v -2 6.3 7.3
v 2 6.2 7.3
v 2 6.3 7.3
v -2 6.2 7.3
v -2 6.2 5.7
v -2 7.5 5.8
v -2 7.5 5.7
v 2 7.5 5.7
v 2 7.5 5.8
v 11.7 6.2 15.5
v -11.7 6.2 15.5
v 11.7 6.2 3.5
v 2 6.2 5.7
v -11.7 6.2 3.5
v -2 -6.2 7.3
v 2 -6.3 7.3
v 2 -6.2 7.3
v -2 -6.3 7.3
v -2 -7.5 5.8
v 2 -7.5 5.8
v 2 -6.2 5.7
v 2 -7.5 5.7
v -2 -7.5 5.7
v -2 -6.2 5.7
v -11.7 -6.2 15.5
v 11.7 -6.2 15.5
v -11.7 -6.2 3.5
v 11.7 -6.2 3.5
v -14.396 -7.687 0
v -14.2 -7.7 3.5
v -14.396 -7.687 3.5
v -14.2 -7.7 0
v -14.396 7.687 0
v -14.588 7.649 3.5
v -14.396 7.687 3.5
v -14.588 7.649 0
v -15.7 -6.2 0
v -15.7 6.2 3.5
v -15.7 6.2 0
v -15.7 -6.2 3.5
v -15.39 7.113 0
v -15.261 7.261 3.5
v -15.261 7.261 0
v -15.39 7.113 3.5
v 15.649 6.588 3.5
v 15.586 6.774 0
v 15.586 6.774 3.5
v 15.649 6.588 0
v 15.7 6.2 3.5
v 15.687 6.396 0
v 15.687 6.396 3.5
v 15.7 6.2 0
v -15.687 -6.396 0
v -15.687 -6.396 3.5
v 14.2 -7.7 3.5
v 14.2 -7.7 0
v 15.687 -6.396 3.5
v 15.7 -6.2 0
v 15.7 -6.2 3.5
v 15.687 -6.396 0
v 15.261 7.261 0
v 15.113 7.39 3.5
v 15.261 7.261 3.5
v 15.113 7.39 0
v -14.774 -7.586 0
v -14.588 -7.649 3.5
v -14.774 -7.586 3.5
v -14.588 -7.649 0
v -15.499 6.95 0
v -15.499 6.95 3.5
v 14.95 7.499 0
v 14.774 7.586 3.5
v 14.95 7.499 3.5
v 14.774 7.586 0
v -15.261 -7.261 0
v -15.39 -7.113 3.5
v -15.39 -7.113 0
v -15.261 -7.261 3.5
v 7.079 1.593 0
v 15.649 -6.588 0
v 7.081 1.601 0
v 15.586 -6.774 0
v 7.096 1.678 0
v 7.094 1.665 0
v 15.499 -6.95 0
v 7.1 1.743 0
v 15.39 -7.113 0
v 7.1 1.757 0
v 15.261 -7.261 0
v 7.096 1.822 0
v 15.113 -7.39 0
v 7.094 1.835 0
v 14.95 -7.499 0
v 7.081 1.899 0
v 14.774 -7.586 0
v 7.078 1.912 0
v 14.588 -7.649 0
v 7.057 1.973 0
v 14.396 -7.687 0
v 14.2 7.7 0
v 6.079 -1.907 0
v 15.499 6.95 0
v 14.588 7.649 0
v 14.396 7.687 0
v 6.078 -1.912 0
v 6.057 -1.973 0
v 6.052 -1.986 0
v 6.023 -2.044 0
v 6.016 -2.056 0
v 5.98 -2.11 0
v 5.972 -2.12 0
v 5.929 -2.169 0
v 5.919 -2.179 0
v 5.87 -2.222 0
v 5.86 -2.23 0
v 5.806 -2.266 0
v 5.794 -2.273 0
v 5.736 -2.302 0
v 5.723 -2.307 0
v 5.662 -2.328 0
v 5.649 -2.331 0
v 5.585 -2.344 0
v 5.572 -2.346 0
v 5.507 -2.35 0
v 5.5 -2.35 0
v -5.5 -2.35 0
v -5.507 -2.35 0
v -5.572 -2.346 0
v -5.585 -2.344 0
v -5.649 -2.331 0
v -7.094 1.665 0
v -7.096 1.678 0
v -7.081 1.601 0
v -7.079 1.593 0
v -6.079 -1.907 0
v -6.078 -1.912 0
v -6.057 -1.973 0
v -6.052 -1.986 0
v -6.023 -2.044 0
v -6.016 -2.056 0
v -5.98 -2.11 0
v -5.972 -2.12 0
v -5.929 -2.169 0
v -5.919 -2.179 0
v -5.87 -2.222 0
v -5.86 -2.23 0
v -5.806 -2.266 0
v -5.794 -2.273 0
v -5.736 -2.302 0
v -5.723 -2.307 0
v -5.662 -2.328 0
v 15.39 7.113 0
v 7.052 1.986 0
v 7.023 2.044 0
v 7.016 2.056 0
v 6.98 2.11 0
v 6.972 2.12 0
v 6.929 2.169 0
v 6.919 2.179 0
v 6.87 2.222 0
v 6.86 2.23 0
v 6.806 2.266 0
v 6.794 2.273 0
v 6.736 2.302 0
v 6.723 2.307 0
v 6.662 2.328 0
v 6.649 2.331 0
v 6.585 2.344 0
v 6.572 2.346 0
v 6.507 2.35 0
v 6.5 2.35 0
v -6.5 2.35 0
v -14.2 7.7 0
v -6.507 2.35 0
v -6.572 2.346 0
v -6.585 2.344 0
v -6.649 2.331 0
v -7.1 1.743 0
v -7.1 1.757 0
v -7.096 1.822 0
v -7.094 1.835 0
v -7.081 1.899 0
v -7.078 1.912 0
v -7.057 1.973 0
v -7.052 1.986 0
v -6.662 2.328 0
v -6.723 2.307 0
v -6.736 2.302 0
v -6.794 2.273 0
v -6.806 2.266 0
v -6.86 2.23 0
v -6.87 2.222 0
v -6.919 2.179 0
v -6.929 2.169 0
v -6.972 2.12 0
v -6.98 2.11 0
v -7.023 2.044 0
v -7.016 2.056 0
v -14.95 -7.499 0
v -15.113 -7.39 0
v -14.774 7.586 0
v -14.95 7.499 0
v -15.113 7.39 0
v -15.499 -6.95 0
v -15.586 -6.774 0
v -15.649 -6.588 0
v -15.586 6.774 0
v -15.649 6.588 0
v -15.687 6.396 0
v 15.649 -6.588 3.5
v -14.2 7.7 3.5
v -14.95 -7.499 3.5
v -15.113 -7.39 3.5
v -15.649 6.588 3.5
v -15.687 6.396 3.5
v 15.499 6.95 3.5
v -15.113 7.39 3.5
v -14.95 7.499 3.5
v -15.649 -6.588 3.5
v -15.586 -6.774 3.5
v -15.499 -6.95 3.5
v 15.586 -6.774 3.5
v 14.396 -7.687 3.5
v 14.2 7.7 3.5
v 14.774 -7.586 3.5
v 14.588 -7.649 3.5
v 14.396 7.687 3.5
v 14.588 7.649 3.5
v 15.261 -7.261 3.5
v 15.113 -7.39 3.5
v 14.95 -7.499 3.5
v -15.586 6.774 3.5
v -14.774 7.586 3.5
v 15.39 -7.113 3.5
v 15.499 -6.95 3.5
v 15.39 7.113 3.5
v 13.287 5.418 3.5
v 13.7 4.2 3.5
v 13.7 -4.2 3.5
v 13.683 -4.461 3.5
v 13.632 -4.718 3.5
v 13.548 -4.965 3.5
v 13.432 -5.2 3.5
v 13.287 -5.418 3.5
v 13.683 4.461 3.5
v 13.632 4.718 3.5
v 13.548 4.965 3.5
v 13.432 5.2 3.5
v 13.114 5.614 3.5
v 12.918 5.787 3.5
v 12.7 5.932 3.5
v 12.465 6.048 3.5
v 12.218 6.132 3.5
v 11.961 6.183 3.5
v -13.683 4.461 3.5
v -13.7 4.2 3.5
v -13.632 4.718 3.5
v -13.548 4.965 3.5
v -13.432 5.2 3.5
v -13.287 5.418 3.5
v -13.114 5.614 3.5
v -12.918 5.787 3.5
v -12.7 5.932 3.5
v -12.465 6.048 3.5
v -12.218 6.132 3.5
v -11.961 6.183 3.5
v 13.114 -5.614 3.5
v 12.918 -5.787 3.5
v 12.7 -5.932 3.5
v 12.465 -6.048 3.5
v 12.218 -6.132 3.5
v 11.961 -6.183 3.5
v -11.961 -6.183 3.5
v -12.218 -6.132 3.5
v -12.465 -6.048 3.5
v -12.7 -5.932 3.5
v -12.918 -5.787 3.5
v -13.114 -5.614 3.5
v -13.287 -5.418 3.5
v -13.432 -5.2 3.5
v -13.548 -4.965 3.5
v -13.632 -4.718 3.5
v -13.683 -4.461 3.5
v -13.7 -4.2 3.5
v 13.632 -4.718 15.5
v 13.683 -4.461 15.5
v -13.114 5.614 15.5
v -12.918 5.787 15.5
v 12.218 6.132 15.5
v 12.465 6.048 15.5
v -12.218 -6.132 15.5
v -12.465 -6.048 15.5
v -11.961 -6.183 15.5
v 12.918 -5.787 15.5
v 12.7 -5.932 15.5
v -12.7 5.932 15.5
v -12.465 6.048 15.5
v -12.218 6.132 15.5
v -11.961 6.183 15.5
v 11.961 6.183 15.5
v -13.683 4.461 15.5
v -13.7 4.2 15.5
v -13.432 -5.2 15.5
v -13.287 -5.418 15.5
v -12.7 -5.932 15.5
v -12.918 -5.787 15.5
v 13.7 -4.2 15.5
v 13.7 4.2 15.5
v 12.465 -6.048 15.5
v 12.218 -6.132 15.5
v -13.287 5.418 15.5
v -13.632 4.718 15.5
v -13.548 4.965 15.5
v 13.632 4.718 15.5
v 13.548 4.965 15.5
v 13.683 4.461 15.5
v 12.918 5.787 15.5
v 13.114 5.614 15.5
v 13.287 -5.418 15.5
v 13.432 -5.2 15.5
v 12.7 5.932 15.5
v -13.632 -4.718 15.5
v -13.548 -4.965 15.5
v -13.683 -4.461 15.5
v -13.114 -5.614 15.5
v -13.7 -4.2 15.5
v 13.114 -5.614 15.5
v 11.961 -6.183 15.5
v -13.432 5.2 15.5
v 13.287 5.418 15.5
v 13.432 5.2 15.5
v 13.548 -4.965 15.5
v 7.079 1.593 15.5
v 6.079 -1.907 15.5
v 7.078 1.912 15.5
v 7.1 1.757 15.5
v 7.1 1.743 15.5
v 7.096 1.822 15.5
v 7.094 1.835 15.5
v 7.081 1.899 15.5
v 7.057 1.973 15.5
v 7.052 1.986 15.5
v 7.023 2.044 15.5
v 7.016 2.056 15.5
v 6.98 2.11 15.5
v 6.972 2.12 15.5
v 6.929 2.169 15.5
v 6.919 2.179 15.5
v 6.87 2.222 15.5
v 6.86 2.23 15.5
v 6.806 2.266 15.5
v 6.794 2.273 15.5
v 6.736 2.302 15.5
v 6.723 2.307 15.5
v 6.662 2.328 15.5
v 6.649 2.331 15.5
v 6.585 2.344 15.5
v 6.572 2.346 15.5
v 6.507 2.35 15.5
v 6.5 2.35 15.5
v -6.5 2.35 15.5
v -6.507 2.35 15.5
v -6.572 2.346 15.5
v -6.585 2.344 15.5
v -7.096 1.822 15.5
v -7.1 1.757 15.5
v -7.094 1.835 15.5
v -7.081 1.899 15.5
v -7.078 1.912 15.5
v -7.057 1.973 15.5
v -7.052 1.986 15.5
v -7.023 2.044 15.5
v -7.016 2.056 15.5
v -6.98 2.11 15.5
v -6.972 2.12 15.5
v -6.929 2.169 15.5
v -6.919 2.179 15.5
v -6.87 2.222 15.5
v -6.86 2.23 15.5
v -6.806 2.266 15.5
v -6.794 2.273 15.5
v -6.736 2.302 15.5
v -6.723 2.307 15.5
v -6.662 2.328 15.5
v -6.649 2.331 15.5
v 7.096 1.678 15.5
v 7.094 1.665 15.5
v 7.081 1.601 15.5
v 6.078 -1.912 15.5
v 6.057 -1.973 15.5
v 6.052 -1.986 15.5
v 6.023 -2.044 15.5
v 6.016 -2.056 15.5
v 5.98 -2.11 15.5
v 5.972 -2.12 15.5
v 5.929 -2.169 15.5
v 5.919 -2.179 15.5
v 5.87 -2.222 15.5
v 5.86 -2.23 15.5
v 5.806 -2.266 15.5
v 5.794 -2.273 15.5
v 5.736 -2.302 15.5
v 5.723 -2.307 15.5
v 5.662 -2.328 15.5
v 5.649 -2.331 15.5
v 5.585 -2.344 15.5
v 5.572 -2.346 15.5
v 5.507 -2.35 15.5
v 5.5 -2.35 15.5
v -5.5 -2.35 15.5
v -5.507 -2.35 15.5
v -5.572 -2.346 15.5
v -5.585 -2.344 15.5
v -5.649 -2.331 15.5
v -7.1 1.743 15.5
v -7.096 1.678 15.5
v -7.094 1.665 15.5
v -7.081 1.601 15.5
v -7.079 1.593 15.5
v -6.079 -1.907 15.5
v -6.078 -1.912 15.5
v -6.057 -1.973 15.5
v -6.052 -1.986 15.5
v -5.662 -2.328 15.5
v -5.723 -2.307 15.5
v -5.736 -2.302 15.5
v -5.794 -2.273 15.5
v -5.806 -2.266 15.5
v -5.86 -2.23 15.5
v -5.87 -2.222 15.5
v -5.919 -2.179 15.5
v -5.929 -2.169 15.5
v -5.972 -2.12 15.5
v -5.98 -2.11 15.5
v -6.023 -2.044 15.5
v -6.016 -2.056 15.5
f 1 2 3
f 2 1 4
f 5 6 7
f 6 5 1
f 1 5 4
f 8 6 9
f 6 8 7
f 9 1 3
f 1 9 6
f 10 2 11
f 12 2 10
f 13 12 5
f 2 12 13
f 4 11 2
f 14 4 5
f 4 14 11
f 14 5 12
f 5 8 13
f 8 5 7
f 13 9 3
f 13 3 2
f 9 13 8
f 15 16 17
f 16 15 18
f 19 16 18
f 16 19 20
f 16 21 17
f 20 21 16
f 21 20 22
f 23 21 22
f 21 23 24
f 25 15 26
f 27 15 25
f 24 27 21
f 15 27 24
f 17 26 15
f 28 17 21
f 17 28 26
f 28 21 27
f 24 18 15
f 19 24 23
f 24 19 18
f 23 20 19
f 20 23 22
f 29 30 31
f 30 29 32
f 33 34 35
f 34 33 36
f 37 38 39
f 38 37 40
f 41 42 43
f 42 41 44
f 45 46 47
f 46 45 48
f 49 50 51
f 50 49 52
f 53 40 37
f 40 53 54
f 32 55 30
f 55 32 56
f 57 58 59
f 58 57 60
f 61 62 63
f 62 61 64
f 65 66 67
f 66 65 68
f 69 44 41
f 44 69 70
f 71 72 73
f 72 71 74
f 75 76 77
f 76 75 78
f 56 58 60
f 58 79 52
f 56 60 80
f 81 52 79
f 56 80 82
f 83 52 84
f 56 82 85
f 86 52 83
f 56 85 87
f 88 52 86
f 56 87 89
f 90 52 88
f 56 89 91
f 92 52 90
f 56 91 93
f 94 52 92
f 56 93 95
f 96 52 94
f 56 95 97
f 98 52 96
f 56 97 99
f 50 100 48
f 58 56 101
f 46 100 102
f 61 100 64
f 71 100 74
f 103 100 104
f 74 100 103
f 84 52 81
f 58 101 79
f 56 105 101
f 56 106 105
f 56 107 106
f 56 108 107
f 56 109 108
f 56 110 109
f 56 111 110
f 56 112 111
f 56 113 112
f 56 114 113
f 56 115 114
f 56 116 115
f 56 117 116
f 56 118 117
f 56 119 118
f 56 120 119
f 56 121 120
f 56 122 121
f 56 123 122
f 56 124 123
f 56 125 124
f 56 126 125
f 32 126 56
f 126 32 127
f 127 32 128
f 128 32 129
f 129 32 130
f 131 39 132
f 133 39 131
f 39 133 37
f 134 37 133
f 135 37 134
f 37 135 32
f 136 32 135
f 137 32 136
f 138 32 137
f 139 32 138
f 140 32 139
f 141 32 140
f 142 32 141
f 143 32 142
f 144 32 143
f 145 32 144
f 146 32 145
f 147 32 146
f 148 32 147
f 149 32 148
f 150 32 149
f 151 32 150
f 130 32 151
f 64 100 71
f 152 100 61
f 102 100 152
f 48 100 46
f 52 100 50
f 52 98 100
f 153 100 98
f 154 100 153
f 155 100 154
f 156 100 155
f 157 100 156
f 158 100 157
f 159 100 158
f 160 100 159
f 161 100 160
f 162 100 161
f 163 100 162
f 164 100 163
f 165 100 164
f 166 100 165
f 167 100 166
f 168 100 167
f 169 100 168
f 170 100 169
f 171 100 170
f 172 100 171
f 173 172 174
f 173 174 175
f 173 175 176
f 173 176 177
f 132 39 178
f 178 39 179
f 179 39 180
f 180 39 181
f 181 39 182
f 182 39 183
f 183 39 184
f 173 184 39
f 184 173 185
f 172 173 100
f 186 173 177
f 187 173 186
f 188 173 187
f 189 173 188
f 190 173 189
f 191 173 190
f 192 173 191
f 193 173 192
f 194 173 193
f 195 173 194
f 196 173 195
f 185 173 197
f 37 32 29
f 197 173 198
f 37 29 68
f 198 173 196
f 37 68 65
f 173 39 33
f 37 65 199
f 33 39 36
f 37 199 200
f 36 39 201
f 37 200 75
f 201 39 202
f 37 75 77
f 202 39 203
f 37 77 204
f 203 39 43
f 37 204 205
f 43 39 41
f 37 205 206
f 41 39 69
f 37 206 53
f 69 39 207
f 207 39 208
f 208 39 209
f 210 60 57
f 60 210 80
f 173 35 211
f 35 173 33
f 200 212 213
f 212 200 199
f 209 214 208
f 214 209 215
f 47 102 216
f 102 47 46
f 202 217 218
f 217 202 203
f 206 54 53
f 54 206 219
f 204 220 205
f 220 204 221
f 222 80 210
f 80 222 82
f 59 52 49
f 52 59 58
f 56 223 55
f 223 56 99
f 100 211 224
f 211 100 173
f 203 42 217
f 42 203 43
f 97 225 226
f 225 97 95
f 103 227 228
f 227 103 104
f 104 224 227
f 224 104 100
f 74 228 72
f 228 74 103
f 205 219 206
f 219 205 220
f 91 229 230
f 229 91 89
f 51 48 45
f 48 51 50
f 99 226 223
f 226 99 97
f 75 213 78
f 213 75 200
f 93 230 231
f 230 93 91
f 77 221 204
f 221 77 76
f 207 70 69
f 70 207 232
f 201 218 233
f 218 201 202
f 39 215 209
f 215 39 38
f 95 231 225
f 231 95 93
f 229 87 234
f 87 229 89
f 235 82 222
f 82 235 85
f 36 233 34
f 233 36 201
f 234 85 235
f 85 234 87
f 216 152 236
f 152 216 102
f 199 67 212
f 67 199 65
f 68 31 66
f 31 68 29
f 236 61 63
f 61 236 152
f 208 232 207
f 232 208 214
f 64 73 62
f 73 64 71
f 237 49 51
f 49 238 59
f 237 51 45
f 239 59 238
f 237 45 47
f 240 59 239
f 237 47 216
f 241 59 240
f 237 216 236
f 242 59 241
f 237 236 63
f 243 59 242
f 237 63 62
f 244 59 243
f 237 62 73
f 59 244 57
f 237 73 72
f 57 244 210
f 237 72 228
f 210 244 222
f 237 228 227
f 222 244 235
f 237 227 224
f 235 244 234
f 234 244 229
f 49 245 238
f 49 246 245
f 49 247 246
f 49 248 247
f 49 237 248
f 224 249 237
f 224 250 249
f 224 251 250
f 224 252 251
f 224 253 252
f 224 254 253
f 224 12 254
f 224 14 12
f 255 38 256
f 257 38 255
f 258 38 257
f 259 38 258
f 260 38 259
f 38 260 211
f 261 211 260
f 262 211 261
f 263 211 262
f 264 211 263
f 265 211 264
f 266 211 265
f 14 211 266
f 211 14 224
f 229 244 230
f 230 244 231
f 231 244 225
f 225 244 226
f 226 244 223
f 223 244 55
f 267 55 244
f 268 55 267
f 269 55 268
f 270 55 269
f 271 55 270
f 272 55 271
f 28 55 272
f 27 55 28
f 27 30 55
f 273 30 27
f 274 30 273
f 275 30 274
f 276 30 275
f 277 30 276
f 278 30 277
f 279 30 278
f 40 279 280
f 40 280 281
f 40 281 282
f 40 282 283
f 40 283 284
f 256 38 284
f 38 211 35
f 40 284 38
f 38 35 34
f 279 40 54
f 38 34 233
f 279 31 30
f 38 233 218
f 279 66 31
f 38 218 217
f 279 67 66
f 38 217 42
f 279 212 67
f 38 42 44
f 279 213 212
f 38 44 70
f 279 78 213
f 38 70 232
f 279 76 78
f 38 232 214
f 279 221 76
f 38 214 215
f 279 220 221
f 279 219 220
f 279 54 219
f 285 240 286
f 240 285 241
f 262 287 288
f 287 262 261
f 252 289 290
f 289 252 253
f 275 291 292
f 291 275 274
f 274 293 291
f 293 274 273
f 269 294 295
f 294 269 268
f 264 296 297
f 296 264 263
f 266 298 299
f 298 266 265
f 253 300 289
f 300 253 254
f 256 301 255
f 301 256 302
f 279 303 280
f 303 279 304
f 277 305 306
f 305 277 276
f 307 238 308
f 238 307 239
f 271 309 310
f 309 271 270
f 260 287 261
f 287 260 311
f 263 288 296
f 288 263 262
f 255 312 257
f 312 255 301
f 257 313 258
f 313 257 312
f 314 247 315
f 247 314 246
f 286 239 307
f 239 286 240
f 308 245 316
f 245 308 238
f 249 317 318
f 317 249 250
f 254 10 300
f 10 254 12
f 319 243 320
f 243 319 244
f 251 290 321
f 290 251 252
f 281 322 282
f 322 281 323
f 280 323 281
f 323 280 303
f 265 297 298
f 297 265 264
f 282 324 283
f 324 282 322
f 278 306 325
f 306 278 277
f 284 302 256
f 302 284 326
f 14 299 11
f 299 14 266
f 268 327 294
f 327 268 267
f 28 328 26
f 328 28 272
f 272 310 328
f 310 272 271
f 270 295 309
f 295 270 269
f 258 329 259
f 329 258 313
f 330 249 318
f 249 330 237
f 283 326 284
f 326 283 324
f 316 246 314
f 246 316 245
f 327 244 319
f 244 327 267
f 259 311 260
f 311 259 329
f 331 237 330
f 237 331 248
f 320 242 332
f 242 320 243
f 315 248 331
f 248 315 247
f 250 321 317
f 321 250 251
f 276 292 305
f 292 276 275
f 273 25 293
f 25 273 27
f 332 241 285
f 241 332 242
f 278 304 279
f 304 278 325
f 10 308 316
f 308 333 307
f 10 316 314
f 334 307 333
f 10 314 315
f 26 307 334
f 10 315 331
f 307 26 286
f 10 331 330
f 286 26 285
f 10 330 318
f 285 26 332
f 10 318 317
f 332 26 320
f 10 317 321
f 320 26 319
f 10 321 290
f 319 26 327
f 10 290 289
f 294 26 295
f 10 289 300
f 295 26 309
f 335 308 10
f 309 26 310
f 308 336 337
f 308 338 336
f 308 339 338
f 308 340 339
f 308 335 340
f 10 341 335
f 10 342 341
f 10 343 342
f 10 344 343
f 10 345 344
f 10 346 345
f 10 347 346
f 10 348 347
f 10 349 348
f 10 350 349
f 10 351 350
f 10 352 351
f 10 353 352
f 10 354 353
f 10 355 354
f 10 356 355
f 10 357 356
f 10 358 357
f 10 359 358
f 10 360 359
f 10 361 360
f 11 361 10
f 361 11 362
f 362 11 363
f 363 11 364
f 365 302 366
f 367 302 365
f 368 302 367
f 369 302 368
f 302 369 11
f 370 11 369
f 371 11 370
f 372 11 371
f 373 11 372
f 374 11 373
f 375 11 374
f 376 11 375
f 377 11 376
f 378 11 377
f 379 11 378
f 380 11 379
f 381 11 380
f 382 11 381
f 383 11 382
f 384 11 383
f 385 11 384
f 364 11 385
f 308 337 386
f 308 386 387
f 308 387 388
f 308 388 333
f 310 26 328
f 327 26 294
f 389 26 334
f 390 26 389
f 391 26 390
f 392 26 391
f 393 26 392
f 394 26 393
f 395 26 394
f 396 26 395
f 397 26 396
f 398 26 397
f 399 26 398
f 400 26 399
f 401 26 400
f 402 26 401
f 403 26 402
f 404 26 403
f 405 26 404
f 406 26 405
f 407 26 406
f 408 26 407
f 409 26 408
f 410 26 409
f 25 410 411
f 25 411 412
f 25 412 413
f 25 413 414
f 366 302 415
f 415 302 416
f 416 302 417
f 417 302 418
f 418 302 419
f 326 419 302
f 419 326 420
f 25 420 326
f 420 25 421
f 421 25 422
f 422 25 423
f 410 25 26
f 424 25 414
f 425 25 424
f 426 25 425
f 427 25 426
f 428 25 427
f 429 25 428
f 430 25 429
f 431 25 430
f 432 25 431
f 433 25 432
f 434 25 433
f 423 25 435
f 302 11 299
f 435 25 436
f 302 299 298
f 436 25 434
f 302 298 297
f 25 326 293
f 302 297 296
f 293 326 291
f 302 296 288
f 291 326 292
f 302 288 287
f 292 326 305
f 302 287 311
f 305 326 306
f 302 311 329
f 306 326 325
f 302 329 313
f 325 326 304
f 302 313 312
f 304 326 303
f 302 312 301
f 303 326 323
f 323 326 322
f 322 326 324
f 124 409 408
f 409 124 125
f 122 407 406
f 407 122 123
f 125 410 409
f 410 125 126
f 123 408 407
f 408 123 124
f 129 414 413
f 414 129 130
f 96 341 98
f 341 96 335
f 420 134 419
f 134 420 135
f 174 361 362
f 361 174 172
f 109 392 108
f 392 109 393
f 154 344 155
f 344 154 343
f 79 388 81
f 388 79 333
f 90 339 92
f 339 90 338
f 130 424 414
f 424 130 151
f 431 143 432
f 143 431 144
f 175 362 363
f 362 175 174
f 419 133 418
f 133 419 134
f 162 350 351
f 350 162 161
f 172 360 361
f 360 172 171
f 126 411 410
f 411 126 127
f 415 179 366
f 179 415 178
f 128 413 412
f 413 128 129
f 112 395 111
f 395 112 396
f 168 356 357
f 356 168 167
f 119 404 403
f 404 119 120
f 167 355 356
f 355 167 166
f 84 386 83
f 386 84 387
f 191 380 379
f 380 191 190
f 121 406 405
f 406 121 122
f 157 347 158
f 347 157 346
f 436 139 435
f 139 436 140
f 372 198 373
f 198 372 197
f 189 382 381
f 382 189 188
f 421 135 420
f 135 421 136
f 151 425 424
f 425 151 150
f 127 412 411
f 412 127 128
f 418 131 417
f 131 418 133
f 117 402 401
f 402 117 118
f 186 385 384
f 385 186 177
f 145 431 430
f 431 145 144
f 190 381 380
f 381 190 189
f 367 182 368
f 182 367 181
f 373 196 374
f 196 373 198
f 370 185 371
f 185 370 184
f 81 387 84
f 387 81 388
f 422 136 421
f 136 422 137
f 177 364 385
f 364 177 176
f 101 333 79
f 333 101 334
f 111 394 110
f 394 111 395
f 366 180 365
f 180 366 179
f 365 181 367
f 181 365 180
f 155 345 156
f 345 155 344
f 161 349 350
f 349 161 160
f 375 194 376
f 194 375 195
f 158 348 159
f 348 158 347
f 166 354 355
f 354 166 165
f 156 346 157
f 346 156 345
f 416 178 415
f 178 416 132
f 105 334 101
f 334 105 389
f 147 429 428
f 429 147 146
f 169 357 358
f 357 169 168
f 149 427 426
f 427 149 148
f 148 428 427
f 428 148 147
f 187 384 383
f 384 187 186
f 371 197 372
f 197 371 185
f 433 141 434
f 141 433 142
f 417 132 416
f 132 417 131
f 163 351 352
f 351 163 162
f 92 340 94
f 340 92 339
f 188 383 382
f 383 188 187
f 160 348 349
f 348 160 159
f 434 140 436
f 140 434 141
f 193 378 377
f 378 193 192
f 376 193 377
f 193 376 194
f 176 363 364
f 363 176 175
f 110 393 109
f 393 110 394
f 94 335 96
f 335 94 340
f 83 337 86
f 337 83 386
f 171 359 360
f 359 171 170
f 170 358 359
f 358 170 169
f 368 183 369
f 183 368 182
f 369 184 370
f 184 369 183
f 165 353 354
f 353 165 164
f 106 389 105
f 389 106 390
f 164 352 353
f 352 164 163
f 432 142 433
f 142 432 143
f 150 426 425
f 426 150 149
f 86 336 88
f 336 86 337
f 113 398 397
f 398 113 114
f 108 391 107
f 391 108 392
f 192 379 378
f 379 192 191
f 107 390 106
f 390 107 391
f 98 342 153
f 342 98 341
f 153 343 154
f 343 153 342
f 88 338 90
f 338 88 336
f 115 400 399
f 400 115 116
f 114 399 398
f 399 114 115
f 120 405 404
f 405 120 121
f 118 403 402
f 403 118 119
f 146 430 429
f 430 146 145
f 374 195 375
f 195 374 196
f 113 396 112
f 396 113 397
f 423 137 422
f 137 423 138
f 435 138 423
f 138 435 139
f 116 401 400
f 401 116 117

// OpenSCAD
// file: parameters.scad
// ============================================
// MODULAR CABLE ORGANIZER - SHARED PARAMETERS
// ============================================
// All dimensions in mm - include this in all files
// ============================================

$fn = 48;

// === TOLERANCES ===
clearance = 0.3;
port_clearance = 0.1;  // Extra clearance for port openings (reduced - 0.2 was too loose for USB-C)
wall = 1.6;

// === SLOT DIMENSIONS (2:1 aspect ratio) - scaled to 2/3 ===
slot_width = 32;  // Reduced by 1mm for more compact insert
slot_height = 16;  // Reduced by 1mm for more compact insert
slot_depth = 4;  // Reduced from 6mm - less frame depth needed

// === FRAME STRUCTURE ===
frame_wall = 0.5;   // Reduced for more compact frame
frame_border = 8;  // Increased by 10mm for mounting holes with countersink
frame_back = 2;     // Slightly thicker for snap catch strength
mount_hole_dia = 3;
countersink_dia = 6;  // Diameter of countersink for screw heads
countersink_depth = 2;  // Depth of countersink

// === GRID ===
grid_cols = 2;
grid_rows = 2;

// === INSERT BASE DIMENSIONS ===
insert_width = slot_width - (2 * clearance);
insert_height = slot_height - (2 * clearance);
insert_base_depth = slot_depth - 0.5;

// === INSERT BODY (protrudes from frame) ===
insert_body_width = insert_width - 4;
insert_body_height = insert_height - 3;
insert_body_depth = 12;  // Deep enough to accommodate male cable connectors
insert_top_thick = 1.5;  // Top platform thickness

// === SNAP TABS (on neck/body - catch on back plate) ===
snap_tab_width = 4;
snap_tab_protrude = 1.2;  // How far tab sticks out from body
snap_tab_thick = 1.5;     // Z thickness of tab
snap_tab_offset = 2.2;      // Distance from base to tab bottom on insert (increased to clear frame)

// === CONNECTOR PORT DIMENSIONS & BODY DEPTHS ===
// Port dimensions from reference blueprints
// Body depths sized to match typical male connector lengths

// USB-C: 8.4 x 2.6mm, male connector ~9mm
usbc_w = 8.4;
usbc_h = 2.6;
usbc_r = 1.0;
usbc_body_depth = 9;

// USB-A: 14.0 x 6.5mm, male connector ~13mm
usba_w = 14.0;
usba_h = 6.5;
usba_r = 0.5;
usba_body_depth = 13;

// USB Mini: 6.9 x 3.0mm, male connector ~9mm
usb_mini_w = 6.9;
usb_mini_h = 3.0;
usb_mini_r = 0.5;
usb_mini_body_depth = 9;

// USB Micro: 6.9 x 1.8mm, male connector ~7mm
usb_micro_w = 6.9;
usb_micro_h = 1.8;
usb_micro_r = 0.3;
usb_micro_body_depth = 7;

// USB-B: 8.0 x 7.5mm, male connector ~14mm
usb_b_w = 8.0;
usb_b_h = 7.5;
usb_b_r = 1.0;
usb_b_body_depth = 14;

// Lightning: 6.7 x 1.5mm, male connector ~8mm
lightning_w = 6.7;
lightning_h = 1.5;
lightning_r = 0.5;
lightning_body_depth = 8;

// HDMI: 14.0 x 4.5mm, male connector ~16mm
hdmi_w = 14.0;
hdmi_h = 4.5;
hdmi_r = 0.5;
hdmi_body_depth = 16;

// 3.5mm Audio Jack: male plug ~14mm
audio_jack_dia = 6.0;
audio_jack_body_depth = 14;

// Blank/Label: recessed area for label
label_w = 30;
label_h = 12;
label_depth = 0.8;

// === CALCULATED VALUES ===
frame_total_depth = frame_back + slot_depth;
grid_width = (grid_cols * slot_width) + ((grid_cols - 1) * frame_wall);
grid_height = (grid_rows * slot_height) + ((grid_rows - 1) * frame_wall);
frame_width = grid_width + (2 * frame_border);
frame_height_total = grid_height + (2 * frame_border);
insert_total_depth = insert_base_depth + insert_body_depth;
// file: insert_base.scad
// ============================================
// MODULAR CABLE ORGANIZER - BASE INSERT MODULE
// ============================================
// This is the parent module for all insert types
// Include this file and call insert_with_port() with a port shape
// ============================================

include <parameters.scad>

// === BASE INSERT WITH CUSTOM BODY DEPTH ===
module insert_blank_custom(body_depth) {
    union() {
        // Base plate (sits in frame slot)
        rounded_box_rect(insert_width, insert_height, insert_base_depth, 1.5);
        
        // Body (protrudes out front) - custom depth
        translate([0, 0, insert_base_depth])
            rounded_box_rect(insert_body_width, insert_body_height, body_depth, 2);
        
        // Snap tabs on all 4 sides
        snap_tabs_all();
    }
}

// === BASE INSERT (default depth - for backwards compatibility) ===
module insert_blank() {
    insert_blank_custom(insert_body_depth);
}

// === INSERT WITH THROUGH-HOLE PORT (custom depth) ===
// Pass body_depth and a 2D shape as children
module insert_with_port_custom(body_depth) {
    total_depth = insert_base_depth + body_depth;
    difference() {
        insert_blank_custom(body_depth);
        
        // Cut port hole ALL THE WAY through (tube shape)
        translate([0, 0, -0.1])
            linear_extrude(total_depth + 0.2)
            offset(r=port_clearance)  // Add clearance to port opening
            children();
    }
}

// === INSERT WITH THROUGH-HOLE PORT (default depth) ===
module insert_with_port() {
    insert_with_port_custom(insert_body_depth) children();
}

// === PRE-MADE INSERT MODULES WITH CORRECT DEPTHS ===
module insert_usbc() {
    insert_with_port_custom(usbc_body_depth) port_usbc();
}

module insert_usba() {
    insert_with_port_custom(usba_body_depth) port_usba();
}

module insert_usb_mini() {
    insert_with_port_custom(usb_mini_body_depth) port_usb_mini();
}

module insert_usb_micro() {
    insert_with_port_custom(usb_micro_body_depth) port_usb_micro();
}

module insert_usb_b() {
    insert_with_port_custom(usb_b_body_depth) port_usb_b();
}

module insert_lightning() {
    insert_with_port_custom(lightning_body_depth) port_lightning();
}

module insert_hdmi() {
    insert_with_port_custom(hdmi_body_depth) port_hdmi();
}

module insert_audio_jack() {
    insert_with_port_custom(audio_jack_body_depth) port_audio_jack();
}

// === SNAP TABS (on neck/body - catch on frame cutouts) ===
// Tabs are on the body, positioned to engage with frame wall cutouts
module snap_tabs_all() {
    // Position tabs up on body (clear of base/frame)
    tab_z = insert_base_depth + snap_tab_offset;
    
    // Tabs on all 4 sides of the body
    for (angle = [0, 90, 180, 270]) {
        rotate([0, 0, angle])
            translate([0, insert_body_height/2, tab_z])
            neck_snap_tab();
    }
}

module neck_snap_tab() {
    // Wedge shape (FLIPPED): 
    // - Peak/taper on BOTTOM - slides past back plate when inserting
    // - Flat on TOP - catches and holds
    hull() {
        // Peak of wedge (protruding, at BOTTOM of tab)
        translate([-snap_tab_width/2, snap_tab_protrude, 0])
            cube([snap_tab_width, 0.1, 0.1]);
        // Flat top (at body surface, TOP of tab)
        translate([-snap_tab_width/2, 0, snap_tab_thick])
            cube([snap_tab_width, 0.1, 0.1]);
        // Base of wedge (at body surface, bottom)
        translate([-snap_tab_width/2, 0, 0])
            cube([snap_tab_width, 0.1, 0.1]);
    }
}

module snap_tab_horizontal() {
    hull() {
        translate([0, -snap_tab_protrude/2, 0])
            cube([snap_tab_width, 0.1, snap_tab_thick], center=true);
        translate([0, snap_tab_protrude/2, snap_tab_thick * 0.2])
            cube([snap_tab_width, 0.1, snap_tab_thick * 0.6], center=true);
    }
}

module snap_tab_vertical() {
    hull() {
        translate([-snap_tab_protrude/2, 0, 0])
            cube([0.1, snap_tab_width, snap_tab_thick], center=true);
        translate([snap_tab_protrude/2, 0, snap_tab_thick * 0.2])
            cube([0.1, snap_tab_width, snap_tab_thick * 0.6], center=true);
    }
}

// === UTILITY MODULES ===
module rounded_box_rect(w, d, h, r) {
    translate([0, 0, h/2])
        hull() {
            for (x = [-1, 1], y = [-1, 1])
                translate([x * (w/2 - r), y * (d/2 - r), 0])
                    cylinder(h=h, r=r, center=true);
        }
}

// === PORT SHAPE MODULES (2D) ===
// These define the cutout shapes for each connector type

module port_rounded_rect(w, h, r) {
    // Standard rounded rectangle
    hull() {
        for (x = [-1, 1], y = [-1, 1])
            translate([x * (w/2 - r), y * (h/2 - r)])
                circle(r=r);
    }
}

module port_usbc() {
    port_rounded_rect(usbc_w, usbc_h, usbc_r);
}

module port_usba() {
    port_rounded_rect(usba_w, usba_h, usba_r);
}

module port_usb_mini() {
    port_rounded_rect(usb_mini_w, usb_mini_h, usb_mini_r);
}

module port_usb_micro() {
    port_rounded_rect(usb_micro_w, usb_micro_h, usb_micro_r);
}

module port_usb_b() {
    // USB-B has beveled top corners
    hull() {
        // Bottom corners (full radius)
        for (x = [-1, 1])
            translate([x * (usb_b_w/2 - usb_b_r), -(usb_b_h/2 - usb_b_r)])
                circle(r=usb_b_r);
        // Top corners (chamfered - moved inward)
        for (x = [-1, 1])
            translate([x * (usb_b_w/2 - usb_b_r - 1), (usb_b_h/2 - usb_b_r)])
                circle(r=usb_b_r);
    }
}

module port_lightning() {
    port_rounded_rect(lightning_w, lightning_h, lightning_r);
}

module port_hdmi() {
    // HDMI is tapered (wider at top)
    hull() {
        // Top (wider)
        for (x = [-1, 1])
            translate([x * (hdmi_w/2 - hdmi_r), (hdmi_h/2 - hdmi_r)])
                circle(r=hdmi_r);
        // Bottom (narrower)
        for (x = [-1, 1])
            translate([x * (hdmi_w/2 - hdmi_r - 1), -(hdmi_h/2 - hdmi_r)])
                circle(r=hdmi_r);
    }
}

module port_audio_jack() {
    circle(d=audio_jack_dia);
}

module port_label_recess() {
    // Shallow rectangular recess for labels
    square([label_w, label_h], center=true);
}

// === RENDER (for testing this file directly) ===
// insert_blank();
// main file
// ============================================
// HDMI FEMALE INSERT
// Port: 14.0mm x 4.5mm tapered shape
// ============================================

include <insert_base.scad>

module insert_hdmi() {
    insert_with_port() port_hdmi();
}

// Render
insert_hdmi();
